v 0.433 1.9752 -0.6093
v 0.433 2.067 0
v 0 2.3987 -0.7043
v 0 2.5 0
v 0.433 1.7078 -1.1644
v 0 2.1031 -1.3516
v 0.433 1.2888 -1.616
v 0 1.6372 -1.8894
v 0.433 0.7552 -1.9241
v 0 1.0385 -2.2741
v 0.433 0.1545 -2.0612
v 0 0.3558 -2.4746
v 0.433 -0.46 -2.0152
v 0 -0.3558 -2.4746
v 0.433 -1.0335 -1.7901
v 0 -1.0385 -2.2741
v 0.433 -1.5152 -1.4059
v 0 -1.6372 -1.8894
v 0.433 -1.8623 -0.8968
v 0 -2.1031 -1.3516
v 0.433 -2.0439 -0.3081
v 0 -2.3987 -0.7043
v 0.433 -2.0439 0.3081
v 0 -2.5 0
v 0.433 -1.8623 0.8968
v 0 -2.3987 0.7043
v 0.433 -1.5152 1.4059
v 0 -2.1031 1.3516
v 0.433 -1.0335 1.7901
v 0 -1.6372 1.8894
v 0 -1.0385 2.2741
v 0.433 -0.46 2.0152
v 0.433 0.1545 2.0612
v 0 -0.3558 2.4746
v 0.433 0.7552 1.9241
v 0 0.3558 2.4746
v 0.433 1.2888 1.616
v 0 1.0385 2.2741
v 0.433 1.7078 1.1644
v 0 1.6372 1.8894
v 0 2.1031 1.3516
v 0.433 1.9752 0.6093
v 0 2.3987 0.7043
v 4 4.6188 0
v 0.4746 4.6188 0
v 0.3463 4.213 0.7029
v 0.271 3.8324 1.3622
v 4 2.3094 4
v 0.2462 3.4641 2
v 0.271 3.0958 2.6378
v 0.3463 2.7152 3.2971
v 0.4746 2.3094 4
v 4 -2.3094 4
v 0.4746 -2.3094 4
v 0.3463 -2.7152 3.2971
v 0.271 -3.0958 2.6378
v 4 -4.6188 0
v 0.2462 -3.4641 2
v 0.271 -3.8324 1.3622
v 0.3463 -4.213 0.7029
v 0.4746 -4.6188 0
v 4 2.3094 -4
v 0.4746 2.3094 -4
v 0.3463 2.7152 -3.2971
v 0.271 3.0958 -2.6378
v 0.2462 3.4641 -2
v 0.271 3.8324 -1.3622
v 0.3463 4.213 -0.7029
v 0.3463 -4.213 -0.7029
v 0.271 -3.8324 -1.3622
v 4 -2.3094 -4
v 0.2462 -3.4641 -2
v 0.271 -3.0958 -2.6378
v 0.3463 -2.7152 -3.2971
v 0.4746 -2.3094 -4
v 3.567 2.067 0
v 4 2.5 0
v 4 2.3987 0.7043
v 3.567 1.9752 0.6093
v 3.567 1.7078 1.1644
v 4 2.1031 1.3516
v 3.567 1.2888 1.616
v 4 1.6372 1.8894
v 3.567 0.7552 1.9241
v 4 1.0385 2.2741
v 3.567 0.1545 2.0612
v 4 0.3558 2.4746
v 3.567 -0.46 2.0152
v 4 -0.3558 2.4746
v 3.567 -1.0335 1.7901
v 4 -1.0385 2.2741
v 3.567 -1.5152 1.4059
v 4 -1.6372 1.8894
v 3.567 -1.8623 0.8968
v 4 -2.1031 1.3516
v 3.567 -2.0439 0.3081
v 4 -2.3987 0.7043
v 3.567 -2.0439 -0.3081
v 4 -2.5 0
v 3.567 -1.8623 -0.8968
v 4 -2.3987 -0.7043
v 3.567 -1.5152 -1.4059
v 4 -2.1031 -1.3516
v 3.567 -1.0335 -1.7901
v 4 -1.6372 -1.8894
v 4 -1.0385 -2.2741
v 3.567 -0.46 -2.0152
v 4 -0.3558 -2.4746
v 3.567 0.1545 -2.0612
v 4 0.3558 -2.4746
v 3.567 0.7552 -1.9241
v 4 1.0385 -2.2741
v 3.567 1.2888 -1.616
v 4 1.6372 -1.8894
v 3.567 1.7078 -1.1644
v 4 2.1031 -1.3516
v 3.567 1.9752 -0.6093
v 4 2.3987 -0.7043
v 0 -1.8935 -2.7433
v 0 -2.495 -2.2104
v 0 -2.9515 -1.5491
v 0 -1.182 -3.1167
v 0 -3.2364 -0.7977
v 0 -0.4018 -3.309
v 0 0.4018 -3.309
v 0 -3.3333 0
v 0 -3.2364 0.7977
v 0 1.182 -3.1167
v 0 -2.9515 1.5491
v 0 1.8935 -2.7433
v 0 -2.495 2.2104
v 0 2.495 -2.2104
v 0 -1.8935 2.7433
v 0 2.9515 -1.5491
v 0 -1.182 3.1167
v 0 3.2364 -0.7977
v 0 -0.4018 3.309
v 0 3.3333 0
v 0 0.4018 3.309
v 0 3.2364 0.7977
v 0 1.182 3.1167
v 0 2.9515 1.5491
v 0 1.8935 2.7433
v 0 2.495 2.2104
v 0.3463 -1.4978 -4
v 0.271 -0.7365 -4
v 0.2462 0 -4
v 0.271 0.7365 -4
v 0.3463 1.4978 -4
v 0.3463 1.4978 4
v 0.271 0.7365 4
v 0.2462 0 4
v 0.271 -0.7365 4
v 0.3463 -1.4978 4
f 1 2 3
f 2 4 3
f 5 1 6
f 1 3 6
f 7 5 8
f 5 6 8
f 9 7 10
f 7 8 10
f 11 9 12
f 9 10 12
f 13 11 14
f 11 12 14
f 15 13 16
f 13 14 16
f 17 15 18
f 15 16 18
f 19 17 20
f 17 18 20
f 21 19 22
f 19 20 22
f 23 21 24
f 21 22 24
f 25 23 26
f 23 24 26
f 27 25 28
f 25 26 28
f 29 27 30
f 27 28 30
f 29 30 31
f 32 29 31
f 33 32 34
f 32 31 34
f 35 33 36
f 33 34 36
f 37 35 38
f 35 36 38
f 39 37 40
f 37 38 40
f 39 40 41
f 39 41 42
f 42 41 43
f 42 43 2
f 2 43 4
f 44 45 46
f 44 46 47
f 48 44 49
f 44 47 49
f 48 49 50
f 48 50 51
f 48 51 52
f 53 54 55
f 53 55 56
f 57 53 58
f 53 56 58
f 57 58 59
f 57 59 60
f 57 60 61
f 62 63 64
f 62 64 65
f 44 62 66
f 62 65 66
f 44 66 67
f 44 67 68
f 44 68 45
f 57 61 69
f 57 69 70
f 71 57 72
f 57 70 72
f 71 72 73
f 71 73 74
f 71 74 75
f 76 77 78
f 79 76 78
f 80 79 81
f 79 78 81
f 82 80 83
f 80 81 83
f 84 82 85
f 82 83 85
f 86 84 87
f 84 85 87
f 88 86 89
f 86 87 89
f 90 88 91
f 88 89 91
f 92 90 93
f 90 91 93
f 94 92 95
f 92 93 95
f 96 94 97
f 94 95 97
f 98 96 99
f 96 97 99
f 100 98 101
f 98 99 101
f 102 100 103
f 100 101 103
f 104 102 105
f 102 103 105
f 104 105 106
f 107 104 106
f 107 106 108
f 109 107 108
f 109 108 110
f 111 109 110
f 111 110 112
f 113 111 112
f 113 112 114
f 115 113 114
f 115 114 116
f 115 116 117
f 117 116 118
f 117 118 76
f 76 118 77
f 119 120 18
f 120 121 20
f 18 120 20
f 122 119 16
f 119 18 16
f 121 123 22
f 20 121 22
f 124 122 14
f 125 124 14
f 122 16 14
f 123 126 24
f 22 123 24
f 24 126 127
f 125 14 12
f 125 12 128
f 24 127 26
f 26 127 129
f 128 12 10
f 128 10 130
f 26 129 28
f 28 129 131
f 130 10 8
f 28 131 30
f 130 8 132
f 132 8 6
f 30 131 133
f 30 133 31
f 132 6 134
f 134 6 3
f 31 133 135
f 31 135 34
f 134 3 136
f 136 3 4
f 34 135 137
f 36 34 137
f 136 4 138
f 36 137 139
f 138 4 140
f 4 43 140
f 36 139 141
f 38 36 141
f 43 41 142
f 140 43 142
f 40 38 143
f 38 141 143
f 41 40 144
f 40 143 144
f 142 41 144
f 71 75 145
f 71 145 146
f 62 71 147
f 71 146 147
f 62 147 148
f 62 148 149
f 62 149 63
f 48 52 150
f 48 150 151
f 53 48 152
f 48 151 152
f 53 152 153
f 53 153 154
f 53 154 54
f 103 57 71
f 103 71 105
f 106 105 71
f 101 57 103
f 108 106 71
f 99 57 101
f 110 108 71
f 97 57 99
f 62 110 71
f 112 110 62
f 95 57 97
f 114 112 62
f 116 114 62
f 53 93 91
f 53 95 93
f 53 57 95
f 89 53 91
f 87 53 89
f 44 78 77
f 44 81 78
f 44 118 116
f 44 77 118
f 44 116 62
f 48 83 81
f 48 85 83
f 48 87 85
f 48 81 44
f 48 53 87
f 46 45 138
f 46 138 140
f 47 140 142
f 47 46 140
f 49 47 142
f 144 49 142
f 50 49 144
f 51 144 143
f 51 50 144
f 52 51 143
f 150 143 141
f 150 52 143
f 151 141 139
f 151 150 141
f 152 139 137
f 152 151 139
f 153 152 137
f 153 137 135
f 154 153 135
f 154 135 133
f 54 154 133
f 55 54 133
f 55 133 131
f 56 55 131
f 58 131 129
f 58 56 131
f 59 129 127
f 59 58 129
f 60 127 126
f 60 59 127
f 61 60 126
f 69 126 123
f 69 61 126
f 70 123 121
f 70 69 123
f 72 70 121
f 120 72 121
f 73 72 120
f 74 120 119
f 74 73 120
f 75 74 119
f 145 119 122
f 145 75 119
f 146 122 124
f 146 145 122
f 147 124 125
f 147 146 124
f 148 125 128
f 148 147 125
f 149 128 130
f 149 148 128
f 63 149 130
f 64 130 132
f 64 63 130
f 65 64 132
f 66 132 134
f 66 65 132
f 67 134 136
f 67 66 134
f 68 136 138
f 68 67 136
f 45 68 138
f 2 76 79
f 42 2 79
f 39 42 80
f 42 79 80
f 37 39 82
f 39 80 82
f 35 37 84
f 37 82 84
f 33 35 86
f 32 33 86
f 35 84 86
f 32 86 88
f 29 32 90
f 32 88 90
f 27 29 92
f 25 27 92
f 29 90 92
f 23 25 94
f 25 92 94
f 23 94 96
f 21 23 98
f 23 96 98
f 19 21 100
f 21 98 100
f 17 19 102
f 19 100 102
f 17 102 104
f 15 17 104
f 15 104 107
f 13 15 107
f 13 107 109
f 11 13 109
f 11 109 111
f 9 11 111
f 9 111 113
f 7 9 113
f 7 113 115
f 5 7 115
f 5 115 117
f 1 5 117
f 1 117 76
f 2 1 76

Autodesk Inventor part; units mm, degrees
sketch "Sketch_1" plane through (0, 0, 0) normal (0, 0, 1) x (1, 0, 0)
  line L0 (4, 0) -> (0, 0)
  line L1 (0, 2.5) -> (0.433, 2.067)
  line L2 (0.433, 2.067) -> (3.567, 2.067)
  line L3 (3.567, 2.067) -> (4, 2.5)
  line L4 (4, 2.5) -> (4, 5)
  line L5 (4, 5) -> (0.6154, 5)
  line L6 (0.6154, 5) -> (0, 3.3333)
  line L7 (0, 3.3333) -> (0, 2.5)
revolve "Revolution1" add sketch "Sketch_1" angle 360 about axis through (4, 0, 0) along (1, 0, 0)
thread "Thread1" size "M5x0.8" class "6H" standard "ISO Metric profile" full length
sketch "Sketch_2" plane through (0, 0, 0) normal (1, 0, 0) x (0, 1, 0)
  line L0 (-4.6188, 8) -> (-9.2376, 0)
  line L1 (-9.2376, 0) -> (-4.6188, -8)
  line L2 (-4.6188, -8) -> (4.6188, -8)
  line L3 (4.6188, -8) -> (9.2376, 0)
  line L4 (9.2376, 0) -> (4.6188, 8)
  line L5 (4.6188, 8) -> (-4.6188, 8)
  line L6 (-2.3094, 4) -> (-4.6188, 0)
  line L7 (-4.6188, 0) -> (-2.3094, -4)
  line L8 (-2.3094, -4) -> (2.3094, -4)
  line L9 (2.3094, -4) -> (4.6188, 0)
  line L10 (4.6188, 0) -> (2.3094, 4)
  line L11 (2.3094, 4) -> (-2.3094, 4)
extrude "Extrusion1" cut sketch "Sketch_2" along normal blind 4
ref_plane "nut_to_pad_XY" through (0, 0, 0) normal (1, 0, 0) x (0, 0, -1)
ref_plane "nut_to_pad_YZ" through (0, 0, 0) normal (0, 0, -1) x (0, 1, 0)
ref_plane "nut_to_pad_ZX" through (0, 0, 0) normal (0, 1, 0) x (1, 0, 0)
properties part number "NFJN5nut"
